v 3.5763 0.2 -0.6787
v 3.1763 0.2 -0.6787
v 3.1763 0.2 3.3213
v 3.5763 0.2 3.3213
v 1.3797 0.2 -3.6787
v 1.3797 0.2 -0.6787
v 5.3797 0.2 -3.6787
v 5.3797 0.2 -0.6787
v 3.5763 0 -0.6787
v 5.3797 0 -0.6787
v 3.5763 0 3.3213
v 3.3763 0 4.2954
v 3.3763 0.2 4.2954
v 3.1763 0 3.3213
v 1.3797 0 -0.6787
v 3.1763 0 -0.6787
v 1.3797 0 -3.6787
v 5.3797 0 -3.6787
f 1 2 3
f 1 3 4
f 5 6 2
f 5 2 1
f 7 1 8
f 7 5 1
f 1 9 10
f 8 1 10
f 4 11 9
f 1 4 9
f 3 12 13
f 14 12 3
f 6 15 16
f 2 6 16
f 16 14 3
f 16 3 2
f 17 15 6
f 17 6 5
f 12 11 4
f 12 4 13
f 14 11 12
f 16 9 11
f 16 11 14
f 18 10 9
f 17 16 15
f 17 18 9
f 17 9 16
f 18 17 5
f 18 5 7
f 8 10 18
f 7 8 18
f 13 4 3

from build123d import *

# Parameters (mm, degrees)
SKETCH1_W           = 0.4
SKETCH1_H           = 4
SKETCH1_W_2         = 4
SKETCH1_H_2         = 3
BOSS_EXTRUDE1_DEPTH = 0.2
BOSS_EXTRUDE3_START = -0.2
BOSS_EXTRUDE3_DEPTH = 0.200006


with BuildPart() as part:
    # Sketch1 → Boss-Extrude1 (new body)
    with BuildSketch(Plane(origin=(0, 0, 0), x_dir=(1, 0, 0), z_dir=(0, 1, 0))):
        with Locations((3.376311417, -1.321333446)):
            Rectangle(SKETCH1_W, SKETCH1_H)
        with Locations((3.379701823, 2.178666554)):
            Rectangle(SKETCH1_W_2, SKETCH1_H_2)
    extrude(amount=BOSS_EXTRUDE1_DEPTH)

    # Sketch5 → Boss-Extrude3 (add)
    with BuildSketch(Plane(origin=(0, 0.2, 0), x_dir=(1, 0, 0), z_dir=(0, 1, 0)).offset(BOSS_EXTRUDE3_START)):
        Polygon((3.176311417, -3.321333446), (3.576311417, -3.321333446), (3.376311417, -4.295422221), align=None)
    extrude(amount=BOSS_EXTRUDE3_DEPTH)


solid = part.part
